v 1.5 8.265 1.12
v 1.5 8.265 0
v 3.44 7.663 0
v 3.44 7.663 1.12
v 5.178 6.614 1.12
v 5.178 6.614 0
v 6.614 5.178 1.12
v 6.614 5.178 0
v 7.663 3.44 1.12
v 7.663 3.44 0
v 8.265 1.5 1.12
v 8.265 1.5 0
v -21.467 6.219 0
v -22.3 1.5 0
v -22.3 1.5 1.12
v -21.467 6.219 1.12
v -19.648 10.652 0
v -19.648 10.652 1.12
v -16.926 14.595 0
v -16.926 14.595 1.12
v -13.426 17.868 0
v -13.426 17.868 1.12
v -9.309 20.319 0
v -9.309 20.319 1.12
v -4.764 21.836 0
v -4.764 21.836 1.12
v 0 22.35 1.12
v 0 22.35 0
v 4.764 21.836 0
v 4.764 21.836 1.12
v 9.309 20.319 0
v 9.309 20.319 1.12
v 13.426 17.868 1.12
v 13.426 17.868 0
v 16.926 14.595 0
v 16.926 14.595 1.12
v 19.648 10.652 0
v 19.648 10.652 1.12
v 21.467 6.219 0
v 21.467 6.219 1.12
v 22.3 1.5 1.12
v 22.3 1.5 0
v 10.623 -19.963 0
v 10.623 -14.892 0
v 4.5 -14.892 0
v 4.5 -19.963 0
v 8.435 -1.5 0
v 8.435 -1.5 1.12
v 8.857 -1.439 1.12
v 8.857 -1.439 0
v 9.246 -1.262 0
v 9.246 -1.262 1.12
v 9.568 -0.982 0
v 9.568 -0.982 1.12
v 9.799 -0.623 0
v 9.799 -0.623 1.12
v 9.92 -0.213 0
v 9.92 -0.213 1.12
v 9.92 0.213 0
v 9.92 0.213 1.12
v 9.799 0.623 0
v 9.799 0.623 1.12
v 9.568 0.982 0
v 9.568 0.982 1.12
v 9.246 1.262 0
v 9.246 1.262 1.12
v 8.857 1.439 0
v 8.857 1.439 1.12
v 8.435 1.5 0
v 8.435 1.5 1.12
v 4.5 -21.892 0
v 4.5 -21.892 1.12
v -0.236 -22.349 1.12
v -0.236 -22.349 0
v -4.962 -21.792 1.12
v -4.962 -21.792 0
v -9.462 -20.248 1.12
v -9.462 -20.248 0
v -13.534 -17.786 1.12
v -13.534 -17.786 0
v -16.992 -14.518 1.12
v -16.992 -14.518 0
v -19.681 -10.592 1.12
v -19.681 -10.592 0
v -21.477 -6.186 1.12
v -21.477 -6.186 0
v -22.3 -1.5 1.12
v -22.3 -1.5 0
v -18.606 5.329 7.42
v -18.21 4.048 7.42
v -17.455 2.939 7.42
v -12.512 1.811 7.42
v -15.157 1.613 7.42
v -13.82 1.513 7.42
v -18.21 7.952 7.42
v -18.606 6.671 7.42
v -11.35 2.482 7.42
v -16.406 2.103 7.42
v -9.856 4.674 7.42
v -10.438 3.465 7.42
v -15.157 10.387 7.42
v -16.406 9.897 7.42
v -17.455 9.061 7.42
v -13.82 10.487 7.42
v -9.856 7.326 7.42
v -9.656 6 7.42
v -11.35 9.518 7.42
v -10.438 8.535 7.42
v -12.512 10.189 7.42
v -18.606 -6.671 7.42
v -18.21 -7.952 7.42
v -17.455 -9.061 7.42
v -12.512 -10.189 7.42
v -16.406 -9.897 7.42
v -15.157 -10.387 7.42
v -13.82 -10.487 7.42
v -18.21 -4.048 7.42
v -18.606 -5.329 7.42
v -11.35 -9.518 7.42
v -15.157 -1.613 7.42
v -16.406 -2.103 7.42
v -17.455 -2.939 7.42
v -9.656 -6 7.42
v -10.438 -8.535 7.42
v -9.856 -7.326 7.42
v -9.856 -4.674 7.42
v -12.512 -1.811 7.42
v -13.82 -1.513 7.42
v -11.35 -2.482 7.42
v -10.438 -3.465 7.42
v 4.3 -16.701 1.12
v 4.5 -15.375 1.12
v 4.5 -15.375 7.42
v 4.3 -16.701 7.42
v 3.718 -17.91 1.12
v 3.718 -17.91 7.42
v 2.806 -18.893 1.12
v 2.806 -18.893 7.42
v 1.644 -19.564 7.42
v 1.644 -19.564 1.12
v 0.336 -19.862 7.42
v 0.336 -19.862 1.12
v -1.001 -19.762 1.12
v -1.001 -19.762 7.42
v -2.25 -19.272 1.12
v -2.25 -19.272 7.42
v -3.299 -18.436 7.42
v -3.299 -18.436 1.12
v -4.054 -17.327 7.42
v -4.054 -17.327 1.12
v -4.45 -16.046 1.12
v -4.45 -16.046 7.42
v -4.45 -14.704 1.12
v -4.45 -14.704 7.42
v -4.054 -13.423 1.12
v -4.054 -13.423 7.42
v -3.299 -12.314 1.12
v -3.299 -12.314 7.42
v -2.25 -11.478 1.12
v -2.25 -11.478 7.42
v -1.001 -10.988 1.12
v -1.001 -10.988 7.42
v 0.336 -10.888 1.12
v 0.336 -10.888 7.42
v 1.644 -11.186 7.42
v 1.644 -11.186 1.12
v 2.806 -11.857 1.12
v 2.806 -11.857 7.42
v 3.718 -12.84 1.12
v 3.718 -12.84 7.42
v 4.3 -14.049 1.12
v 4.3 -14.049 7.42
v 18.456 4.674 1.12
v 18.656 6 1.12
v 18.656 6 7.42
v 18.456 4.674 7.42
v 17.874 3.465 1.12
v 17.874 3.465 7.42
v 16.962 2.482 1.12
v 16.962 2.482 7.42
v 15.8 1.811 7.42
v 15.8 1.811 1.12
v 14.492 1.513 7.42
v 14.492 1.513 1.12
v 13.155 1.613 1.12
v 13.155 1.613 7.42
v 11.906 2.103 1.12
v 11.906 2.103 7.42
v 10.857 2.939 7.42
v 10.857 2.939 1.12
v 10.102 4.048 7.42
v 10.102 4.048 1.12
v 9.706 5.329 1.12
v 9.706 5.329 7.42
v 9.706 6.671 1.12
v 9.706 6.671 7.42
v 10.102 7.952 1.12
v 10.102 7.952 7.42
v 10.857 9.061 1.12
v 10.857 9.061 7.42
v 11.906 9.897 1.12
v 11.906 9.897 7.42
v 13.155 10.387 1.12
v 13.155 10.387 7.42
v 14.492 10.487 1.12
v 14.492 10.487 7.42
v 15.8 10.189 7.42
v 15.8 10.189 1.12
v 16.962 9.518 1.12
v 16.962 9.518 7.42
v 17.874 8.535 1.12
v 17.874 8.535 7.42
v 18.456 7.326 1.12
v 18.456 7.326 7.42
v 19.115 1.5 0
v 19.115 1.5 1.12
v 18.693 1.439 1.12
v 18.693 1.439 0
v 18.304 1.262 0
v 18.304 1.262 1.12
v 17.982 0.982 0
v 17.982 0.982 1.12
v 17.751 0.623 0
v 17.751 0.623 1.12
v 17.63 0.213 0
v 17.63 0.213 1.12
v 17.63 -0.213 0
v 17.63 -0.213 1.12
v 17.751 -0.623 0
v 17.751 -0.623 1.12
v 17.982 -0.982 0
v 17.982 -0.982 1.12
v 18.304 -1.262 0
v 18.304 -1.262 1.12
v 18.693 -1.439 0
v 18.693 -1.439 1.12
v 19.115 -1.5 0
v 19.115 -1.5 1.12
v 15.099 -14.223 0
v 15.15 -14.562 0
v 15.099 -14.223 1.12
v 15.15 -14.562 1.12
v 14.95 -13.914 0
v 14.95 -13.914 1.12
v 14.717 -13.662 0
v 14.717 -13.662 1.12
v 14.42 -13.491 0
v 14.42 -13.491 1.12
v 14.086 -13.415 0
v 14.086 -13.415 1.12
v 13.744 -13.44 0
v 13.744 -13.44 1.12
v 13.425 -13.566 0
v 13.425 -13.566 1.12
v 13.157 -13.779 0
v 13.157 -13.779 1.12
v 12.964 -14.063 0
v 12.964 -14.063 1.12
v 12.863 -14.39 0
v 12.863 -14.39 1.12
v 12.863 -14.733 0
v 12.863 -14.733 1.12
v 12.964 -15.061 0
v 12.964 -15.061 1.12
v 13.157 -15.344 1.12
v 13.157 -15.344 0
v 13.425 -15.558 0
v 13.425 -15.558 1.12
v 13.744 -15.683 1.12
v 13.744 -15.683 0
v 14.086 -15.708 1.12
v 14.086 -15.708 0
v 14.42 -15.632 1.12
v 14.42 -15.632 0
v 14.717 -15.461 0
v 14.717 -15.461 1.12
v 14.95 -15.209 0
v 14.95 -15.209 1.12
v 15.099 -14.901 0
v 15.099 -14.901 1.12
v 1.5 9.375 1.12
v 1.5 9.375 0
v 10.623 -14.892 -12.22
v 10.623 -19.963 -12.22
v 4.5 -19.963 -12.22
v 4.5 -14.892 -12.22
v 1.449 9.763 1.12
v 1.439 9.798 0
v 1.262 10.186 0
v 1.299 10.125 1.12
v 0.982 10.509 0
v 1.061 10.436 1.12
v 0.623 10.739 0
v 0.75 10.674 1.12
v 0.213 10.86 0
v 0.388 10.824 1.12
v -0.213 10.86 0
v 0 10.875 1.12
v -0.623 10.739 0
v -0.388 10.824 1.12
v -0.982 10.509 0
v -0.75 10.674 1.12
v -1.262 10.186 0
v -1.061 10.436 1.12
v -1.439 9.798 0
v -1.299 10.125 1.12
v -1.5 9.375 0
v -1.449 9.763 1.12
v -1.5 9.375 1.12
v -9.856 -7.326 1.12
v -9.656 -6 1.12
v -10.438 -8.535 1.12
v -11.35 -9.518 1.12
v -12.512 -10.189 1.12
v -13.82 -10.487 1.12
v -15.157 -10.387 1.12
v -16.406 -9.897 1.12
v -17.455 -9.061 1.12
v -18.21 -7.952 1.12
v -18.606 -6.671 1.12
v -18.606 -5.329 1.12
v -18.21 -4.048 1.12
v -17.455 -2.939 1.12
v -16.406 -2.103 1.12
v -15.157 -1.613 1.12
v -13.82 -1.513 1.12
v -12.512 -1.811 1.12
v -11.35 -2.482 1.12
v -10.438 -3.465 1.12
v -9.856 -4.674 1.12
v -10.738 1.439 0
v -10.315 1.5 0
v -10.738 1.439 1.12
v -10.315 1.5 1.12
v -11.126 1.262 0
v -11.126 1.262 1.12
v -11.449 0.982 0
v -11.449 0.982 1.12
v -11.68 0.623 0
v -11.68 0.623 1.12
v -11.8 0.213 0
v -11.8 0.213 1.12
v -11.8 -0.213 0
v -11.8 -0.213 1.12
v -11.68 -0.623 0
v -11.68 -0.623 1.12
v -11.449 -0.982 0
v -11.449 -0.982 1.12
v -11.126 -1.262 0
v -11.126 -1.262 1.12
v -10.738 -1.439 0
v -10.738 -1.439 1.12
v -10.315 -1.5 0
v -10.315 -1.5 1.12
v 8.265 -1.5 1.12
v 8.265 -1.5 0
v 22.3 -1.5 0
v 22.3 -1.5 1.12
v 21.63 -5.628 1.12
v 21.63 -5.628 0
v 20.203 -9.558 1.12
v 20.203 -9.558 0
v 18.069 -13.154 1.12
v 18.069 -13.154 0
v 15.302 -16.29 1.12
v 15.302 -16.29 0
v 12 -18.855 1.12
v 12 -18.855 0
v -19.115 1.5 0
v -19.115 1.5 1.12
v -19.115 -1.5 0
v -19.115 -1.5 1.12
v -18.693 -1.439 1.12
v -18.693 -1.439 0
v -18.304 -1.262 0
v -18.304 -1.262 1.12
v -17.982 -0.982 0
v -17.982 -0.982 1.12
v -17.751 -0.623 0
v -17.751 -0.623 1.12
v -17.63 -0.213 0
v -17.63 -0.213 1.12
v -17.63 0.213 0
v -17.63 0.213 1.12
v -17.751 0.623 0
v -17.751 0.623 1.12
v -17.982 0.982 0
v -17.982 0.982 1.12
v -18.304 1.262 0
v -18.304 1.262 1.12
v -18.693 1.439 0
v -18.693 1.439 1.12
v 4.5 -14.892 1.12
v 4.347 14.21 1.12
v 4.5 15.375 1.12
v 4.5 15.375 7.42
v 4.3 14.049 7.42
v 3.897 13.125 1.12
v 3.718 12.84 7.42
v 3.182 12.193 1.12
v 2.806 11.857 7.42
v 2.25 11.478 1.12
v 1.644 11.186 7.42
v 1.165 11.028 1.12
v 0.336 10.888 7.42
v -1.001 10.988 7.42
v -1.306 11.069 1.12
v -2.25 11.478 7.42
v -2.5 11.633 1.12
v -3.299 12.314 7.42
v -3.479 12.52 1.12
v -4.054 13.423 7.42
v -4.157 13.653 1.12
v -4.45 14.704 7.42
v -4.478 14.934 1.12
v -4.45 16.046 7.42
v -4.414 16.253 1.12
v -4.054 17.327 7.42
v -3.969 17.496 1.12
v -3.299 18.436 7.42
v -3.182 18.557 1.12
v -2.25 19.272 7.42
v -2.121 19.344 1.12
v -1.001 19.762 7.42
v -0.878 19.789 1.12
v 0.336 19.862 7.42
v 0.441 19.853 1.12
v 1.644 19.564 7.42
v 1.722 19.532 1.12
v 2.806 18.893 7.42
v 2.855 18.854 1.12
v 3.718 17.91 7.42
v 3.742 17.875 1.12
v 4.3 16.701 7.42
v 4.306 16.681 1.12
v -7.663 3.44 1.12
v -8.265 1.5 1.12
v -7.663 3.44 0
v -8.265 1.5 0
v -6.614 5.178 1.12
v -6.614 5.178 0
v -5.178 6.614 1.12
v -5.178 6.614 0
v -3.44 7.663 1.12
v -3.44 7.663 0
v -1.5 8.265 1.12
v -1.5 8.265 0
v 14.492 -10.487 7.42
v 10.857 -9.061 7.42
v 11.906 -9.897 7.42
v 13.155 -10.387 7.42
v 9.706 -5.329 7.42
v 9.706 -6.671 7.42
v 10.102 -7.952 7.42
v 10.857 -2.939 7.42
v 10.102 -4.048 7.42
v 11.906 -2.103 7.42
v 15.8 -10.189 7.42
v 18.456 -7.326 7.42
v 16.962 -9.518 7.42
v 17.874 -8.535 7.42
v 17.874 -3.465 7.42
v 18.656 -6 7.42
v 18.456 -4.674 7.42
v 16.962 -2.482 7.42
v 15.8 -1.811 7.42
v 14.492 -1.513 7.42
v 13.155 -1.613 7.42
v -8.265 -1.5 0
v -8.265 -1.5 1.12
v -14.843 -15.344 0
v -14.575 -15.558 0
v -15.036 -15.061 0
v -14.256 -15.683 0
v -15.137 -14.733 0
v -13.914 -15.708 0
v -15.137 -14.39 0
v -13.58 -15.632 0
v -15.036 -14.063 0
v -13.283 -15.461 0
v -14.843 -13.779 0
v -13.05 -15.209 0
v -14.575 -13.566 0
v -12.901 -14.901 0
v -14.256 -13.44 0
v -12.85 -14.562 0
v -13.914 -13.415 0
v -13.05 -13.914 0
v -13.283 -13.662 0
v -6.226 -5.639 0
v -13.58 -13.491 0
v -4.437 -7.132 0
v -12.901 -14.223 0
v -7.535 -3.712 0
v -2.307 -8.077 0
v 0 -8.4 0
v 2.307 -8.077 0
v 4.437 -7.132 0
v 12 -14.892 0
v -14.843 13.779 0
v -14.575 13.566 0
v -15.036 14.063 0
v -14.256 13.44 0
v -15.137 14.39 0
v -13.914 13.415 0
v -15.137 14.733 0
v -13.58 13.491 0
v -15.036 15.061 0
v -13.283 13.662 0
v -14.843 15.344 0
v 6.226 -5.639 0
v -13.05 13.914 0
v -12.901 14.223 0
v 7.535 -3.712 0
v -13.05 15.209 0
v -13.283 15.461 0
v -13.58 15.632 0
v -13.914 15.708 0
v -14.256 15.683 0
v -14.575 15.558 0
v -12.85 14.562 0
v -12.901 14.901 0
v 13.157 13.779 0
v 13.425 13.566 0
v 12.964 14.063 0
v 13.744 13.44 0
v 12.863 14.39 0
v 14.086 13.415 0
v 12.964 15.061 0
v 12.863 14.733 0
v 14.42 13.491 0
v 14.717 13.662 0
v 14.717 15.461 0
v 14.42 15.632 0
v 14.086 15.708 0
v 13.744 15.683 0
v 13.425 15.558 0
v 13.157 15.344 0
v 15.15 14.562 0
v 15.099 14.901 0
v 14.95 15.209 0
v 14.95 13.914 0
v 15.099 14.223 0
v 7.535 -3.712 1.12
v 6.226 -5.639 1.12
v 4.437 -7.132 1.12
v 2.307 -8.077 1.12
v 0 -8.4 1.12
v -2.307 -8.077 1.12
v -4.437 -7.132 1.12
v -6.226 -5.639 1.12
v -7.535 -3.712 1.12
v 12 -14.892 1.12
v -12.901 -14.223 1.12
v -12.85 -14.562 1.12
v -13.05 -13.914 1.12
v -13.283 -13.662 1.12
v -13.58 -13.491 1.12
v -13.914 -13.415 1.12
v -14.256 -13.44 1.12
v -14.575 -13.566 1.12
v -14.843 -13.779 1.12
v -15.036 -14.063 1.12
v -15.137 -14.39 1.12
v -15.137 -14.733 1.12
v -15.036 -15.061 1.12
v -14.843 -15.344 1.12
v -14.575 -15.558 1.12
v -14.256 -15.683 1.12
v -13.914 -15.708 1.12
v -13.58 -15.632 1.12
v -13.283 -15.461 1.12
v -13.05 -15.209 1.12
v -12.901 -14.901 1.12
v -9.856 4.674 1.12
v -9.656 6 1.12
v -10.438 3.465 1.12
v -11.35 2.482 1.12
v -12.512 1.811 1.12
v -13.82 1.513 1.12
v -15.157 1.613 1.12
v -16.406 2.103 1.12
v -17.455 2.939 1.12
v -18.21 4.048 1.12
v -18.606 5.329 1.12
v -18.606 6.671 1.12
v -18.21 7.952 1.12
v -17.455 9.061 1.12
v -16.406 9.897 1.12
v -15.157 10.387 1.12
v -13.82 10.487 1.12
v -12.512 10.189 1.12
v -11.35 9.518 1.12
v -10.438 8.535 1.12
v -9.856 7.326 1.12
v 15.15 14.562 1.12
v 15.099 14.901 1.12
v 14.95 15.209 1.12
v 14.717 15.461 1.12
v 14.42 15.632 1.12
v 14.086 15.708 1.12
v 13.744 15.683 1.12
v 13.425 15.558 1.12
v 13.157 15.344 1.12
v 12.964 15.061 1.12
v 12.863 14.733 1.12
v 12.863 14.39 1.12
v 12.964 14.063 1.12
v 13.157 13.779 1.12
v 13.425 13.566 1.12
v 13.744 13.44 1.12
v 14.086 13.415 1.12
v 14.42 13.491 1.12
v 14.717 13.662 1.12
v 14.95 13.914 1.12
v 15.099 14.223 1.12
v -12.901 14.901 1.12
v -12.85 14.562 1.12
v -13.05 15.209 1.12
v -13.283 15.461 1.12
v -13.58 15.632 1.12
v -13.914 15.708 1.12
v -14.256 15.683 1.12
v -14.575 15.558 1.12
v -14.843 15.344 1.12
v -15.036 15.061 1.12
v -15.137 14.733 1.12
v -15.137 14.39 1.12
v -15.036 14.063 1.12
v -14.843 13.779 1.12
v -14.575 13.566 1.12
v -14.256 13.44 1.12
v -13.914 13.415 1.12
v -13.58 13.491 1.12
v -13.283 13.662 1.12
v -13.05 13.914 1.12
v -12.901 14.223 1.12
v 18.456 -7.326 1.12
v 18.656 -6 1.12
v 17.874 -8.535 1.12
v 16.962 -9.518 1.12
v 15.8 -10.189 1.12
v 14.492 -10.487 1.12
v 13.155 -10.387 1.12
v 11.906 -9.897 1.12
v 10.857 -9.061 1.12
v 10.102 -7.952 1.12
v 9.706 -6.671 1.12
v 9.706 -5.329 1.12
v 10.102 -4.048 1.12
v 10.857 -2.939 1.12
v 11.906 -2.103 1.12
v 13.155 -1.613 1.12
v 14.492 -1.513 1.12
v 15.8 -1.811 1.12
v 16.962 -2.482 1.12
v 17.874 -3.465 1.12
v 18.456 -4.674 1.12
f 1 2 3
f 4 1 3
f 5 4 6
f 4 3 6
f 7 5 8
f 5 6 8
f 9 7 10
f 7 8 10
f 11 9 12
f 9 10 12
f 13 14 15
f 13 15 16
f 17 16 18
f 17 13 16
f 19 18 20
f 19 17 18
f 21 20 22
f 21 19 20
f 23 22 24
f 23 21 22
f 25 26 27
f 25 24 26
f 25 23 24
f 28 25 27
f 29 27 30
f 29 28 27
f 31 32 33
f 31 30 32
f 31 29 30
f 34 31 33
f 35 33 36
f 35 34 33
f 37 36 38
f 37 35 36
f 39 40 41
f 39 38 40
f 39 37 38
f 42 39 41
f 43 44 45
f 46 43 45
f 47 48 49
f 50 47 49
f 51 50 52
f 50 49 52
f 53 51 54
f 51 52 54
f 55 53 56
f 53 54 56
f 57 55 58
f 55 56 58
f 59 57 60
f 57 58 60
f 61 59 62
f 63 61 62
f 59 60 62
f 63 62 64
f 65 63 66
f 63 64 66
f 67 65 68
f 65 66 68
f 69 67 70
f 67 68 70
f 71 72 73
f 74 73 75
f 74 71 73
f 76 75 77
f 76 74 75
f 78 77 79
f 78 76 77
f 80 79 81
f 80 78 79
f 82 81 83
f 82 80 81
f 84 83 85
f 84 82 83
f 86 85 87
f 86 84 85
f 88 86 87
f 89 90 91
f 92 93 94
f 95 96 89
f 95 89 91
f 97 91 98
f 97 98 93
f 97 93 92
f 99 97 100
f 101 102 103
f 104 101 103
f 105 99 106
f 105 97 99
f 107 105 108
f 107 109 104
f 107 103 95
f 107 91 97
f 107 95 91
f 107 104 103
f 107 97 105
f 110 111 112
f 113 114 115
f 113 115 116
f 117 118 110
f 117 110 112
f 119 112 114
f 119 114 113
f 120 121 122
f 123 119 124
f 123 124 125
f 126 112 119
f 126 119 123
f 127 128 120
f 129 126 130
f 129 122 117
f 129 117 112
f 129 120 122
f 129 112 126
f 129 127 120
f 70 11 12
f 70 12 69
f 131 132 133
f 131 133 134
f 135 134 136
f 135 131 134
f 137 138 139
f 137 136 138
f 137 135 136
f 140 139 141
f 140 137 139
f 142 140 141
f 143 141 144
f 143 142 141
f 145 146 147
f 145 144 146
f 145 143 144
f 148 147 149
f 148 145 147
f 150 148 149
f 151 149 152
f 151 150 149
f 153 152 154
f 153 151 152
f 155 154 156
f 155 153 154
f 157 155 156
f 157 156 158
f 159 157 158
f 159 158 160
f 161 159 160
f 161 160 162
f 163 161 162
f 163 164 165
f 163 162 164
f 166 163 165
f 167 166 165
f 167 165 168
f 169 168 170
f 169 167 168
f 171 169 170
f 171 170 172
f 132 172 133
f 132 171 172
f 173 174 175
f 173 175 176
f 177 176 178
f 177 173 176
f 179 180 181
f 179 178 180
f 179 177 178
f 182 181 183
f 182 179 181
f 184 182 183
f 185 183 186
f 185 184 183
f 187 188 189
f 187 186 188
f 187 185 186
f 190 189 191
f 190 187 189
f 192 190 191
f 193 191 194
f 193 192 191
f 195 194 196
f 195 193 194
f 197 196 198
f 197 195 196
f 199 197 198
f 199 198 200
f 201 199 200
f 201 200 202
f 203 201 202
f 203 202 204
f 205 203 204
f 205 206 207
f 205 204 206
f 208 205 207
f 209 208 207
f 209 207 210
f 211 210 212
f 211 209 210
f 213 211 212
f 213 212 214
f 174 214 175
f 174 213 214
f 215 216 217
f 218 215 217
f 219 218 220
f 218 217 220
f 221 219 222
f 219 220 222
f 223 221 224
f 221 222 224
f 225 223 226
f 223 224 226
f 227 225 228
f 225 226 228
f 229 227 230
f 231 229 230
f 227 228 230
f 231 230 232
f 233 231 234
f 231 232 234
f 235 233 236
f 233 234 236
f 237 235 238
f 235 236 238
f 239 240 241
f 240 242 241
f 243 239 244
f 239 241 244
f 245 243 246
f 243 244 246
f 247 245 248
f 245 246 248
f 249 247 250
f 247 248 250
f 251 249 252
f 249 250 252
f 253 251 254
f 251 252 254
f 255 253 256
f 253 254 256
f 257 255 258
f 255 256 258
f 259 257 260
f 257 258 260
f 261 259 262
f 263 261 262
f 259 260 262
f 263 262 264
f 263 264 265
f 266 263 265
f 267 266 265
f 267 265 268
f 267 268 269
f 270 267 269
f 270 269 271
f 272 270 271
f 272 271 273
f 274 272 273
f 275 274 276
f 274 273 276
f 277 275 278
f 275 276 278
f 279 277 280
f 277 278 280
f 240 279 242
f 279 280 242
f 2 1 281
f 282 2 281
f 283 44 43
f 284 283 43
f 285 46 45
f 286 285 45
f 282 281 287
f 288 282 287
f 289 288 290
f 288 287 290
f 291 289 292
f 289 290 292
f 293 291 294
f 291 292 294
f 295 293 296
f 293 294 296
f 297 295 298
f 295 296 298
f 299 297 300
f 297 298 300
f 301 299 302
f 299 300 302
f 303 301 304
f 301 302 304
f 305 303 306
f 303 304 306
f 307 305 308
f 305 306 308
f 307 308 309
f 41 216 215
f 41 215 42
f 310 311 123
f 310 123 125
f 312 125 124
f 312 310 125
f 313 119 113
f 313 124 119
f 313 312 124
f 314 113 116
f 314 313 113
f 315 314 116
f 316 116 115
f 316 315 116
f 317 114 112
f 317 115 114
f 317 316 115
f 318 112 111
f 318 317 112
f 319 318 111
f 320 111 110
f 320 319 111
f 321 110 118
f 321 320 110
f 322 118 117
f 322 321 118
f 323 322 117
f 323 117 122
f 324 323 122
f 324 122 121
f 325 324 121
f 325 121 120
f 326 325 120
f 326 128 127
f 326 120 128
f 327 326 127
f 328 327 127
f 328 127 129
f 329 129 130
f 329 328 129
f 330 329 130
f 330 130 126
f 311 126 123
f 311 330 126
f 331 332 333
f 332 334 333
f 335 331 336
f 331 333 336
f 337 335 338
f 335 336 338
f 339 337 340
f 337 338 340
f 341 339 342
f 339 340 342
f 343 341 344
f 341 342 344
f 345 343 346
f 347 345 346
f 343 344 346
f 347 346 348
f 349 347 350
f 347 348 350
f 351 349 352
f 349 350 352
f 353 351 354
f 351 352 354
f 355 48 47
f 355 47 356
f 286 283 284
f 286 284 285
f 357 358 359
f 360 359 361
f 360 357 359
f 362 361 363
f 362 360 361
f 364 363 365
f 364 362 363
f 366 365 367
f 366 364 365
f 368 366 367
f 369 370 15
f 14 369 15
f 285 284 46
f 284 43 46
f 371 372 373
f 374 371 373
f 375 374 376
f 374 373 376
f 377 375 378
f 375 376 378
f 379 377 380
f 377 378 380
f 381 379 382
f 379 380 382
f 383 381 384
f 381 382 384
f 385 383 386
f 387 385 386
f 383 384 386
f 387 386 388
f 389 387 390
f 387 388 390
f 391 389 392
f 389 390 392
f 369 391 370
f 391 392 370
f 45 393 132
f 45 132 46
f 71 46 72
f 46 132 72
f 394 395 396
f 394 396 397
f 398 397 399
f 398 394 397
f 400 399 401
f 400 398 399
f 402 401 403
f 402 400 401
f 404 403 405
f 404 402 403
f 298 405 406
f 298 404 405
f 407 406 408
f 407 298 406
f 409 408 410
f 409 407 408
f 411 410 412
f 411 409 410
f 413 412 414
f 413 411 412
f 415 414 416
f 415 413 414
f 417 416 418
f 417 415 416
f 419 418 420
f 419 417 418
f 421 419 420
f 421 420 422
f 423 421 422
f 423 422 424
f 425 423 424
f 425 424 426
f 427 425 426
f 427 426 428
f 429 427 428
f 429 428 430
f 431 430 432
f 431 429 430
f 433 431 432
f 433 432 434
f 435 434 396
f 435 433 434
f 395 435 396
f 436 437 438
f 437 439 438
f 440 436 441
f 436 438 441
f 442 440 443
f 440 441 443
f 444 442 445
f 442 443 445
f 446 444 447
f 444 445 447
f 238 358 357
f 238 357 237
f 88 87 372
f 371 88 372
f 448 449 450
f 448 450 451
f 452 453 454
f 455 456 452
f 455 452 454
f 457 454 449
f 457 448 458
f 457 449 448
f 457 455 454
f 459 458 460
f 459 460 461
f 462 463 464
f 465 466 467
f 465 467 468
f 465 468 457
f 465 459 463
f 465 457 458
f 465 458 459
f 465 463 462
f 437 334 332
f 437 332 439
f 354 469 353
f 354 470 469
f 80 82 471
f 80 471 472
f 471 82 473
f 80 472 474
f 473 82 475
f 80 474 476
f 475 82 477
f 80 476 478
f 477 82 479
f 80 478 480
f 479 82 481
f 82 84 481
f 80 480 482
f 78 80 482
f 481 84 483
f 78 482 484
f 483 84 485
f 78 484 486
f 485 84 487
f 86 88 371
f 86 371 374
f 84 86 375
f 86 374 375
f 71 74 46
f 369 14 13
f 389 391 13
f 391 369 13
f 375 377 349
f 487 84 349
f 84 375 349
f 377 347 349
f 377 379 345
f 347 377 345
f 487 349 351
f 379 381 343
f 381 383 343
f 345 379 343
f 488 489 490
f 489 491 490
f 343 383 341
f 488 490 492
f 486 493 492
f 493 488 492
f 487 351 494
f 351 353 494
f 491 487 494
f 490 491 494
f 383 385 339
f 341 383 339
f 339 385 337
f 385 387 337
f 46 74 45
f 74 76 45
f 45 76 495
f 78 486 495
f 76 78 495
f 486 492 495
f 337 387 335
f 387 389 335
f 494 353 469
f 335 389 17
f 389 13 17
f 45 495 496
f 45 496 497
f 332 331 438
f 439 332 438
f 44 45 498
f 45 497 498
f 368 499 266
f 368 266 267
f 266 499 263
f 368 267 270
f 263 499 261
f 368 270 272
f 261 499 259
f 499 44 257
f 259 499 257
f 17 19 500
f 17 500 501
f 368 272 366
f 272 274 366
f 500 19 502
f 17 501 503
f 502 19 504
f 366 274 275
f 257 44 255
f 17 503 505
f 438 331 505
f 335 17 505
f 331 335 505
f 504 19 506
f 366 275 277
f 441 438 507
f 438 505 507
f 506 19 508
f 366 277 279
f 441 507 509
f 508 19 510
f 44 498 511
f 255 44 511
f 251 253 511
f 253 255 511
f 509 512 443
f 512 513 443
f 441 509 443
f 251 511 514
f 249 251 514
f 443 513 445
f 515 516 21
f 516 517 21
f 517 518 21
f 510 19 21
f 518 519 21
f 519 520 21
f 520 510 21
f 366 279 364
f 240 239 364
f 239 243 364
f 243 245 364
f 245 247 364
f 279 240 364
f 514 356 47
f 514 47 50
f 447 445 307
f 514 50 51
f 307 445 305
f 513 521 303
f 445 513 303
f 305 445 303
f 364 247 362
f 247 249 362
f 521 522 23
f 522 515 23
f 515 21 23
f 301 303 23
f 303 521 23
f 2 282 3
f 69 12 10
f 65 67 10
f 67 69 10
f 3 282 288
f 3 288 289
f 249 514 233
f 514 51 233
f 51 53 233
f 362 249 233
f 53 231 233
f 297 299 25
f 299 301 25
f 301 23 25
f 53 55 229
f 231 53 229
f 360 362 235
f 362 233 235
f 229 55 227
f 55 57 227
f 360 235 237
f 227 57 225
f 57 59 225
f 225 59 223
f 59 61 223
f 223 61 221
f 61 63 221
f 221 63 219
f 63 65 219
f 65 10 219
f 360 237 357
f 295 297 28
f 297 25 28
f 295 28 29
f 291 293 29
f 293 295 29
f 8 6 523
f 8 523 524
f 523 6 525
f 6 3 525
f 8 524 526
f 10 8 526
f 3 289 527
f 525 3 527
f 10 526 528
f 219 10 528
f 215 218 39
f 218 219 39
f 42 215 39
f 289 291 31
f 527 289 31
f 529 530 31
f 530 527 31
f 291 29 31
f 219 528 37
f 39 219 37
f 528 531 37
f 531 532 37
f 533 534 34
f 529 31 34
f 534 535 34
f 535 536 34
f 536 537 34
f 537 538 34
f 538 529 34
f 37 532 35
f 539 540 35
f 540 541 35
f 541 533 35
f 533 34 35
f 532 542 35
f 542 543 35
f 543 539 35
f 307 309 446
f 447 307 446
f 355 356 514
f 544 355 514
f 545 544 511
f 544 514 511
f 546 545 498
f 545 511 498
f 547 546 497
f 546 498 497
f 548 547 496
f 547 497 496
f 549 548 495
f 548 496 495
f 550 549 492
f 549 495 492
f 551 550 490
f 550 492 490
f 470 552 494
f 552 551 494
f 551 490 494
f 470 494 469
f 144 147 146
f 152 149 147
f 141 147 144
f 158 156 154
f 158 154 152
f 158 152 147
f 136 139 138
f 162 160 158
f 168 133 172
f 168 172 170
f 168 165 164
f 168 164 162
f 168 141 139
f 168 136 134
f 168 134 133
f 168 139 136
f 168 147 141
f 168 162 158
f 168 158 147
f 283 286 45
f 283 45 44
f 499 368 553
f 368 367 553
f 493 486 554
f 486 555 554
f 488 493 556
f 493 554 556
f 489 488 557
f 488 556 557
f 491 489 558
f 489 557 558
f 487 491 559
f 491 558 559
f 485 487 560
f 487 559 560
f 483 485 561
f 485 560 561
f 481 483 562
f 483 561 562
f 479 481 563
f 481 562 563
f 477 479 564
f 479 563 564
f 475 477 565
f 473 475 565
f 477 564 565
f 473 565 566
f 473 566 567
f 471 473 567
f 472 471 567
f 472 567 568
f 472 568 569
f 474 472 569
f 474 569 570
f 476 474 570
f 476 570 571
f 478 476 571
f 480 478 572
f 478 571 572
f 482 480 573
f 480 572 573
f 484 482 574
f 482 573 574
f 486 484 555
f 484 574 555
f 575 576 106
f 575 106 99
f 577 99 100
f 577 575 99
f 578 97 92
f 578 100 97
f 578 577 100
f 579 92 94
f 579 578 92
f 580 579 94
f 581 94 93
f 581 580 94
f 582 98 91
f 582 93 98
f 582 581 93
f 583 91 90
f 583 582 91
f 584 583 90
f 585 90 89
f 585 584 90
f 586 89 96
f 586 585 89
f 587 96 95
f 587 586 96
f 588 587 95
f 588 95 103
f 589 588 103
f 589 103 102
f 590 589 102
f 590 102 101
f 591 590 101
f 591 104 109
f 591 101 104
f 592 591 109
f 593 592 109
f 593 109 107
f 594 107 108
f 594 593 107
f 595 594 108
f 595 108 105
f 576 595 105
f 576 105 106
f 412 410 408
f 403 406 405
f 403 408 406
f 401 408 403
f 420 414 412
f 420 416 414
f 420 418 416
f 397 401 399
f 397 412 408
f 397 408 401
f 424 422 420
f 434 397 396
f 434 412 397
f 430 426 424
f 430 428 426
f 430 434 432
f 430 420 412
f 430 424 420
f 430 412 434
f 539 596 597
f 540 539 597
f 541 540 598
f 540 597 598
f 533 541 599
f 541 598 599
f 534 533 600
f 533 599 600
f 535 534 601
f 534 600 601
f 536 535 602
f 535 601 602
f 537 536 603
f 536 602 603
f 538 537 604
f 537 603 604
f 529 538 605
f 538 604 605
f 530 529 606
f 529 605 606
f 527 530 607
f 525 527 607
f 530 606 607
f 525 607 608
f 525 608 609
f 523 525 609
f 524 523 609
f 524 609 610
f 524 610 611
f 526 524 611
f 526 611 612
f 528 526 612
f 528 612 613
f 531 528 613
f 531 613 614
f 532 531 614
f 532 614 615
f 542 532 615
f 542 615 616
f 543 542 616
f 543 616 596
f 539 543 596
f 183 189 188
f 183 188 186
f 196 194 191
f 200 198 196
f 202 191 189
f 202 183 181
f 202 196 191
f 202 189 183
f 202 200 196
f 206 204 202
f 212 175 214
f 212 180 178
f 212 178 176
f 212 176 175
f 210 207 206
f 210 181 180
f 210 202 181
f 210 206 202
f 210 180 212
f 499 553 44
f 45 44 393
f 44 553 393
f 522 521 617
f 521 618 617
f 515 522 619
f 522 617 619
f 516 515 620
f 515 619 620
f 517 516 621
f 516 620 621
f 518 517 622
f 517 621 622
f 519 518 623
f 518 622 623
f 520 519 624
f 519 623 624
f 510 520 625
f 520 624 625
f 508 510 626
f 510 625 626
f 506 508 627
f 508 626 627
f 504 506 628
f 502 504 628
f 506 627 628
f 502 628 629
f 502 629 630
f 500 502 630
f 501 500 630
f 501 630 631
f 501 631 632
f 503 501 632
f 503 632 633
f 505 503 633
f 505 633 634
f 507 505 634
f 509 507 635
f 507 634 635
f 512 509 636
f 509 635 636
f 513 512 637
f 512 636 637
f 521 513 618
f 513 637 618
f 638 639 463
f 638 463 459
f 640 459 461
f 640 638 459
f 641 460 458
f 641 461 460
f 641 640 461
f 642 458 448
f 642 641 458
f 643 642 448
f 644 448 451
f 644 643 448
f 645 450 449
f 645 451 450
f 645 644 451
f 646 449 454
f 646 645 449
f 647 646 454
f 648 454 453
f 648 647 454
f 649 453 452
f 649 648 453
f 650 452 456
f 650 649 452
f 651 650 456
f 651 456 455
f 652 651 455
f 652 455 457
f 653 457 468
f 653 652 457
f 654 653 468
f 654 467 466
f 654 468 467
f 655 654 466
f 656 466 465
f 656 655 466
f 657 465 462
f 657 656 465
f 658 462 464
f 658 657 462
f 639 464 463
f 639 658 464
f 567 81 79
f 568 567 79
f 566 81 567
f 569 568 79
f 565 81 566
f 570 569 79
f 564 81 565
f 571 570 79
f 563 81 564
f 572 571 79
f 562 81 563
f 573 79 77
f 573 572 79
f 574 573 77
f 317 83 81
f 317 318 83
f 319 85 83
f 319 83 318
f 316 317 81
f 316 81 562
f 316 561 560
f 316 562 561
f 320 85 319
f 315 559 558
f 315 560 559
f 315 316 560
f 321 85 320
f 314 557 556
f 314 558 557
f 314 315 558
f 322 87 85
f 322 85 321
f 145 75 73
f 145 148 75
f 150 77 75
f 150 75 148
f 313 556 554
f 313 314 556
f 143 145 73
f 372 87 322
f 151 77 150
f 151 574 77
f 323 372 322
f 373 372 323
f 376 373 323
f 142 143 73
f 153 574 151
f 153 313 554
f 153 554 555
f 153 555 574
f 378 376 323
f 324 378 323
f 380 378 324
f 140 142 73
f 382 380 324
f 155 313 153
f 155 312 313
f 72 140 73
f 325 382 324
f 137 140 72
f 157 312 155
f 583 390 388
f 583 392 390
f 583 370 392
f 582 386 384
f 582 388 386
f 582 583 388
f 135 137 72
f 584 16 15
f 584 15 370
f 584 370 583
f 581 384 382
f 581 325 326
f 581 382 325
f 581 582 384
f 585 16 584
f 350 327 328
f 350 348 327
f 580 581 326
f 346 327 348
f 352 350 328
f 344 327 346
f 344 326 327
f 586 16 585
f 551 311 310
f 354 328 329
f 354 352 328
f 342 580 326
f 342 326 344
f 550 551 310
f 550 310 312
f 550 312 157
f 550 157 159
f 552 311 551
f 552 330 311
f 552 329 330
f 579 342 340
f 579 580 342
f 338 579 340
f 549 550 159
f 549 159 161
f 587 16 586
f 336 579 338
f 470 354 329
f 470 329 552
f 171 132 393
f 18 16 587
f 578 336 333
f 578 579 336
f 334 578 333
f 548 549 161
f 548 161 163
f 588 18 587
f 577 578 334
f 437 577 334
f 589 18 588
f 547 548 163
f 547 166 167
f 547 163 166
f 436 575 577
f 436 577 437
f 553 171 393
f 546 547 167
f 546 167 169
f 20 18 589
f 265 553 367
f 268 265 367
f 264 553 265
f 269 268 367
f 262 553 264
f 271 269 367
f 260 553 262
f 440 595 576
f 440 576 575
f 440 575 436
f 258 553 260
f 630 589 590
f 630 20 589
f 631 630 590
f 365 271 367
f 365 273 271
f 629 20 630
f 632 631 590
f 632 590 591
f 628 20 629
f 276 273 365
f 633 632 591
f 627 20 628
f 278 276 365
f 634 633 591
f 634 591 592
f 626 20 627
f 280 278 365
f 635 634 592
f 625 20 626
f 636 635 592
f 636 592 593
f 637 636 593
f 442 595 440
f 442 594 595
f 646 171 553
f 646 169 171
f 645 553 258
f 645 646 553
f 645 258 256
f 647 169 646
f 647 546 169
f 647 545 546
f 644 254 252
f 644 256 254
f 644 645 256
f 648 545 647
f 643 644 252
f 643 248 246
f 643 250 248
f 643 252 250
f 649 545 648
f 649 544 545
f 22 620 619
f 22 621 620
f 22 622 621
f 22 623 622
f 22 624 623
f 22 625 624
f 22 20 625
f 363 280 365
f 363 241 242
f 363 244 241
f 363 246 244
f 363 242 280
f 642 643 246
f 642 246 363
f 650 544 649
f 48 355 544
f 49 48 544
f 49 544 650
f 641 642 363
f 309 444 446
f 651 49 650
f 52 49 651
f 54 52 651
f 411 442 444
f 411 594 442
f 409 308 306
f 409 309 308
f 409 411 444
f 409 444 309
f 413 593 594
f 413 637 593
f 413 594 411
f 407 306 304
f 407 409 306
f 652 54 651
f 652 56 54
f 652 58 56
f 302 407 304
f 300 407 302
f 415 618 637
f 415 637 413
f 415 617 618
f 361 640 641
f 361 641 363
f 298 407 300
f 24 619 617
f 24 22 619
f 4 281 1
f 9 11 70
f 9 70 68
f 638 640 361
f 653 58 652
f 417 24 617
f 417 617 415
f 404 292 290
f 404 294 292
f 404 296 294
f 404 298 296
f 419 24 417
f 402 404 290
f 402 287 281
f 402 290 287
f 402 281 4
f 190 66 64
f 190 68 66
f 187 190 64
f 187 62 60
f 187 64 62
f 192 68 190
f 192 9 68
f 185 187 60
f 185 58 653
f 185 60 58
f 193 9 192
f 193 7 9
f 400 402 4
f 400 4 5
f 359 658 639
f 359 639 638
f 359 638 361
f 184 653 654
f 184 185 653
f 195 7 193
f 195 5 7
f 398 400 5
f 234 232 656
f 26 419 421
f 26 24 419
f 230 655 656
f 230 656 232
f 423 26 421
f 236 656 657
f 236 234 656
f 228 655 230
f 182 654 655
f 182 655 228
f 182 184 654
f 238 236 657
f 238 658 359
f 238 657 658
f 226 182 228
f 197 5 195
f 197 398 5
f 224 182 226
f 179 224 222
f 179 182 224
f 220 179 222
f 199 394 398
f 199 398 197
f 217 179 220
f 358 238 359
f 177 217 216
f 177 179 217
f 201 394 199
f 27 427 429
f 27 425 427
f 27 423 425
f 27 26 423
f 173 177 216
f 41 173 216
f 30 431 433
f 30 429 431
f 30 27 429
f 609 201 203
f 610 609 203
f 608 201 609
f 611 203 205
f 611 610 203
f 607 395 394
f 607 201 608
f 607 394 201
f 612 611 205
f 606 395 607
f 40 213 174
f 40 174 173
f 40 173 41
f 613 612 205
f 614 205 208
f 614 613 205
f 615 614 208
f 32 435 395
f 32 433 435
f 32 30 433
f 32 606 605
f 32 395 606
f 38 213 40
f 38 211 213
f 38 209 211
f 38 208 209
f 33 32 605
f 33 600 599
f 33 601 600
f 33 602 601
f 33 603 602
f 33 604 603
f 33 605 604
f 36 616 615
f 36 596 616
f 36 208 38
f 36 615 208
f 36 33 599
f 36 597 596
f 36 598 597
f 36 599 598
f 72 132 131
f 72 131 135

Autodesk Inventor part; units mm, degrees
ref_plane "YZ Plane" through (0, 0, 0) normal (1, 0, 0) x (0, 1, 0)
ref_plane "XZ Plane" through (0, 0, 0) normal (0, 1, 0) x (-1, 0, 0)
ref_plane "XY Plane" through (0, 0, 0) normal (0, 0, 1) x (1, 0, 0)
sketch "Base" plane through (0, 0, 0) normal (0, 0, 1) x (1, 0, 0)
  circle A0 centre (0, 0) radius 22.35
  circle A1 centre (0, 0) radius 8.4
  dimension "d0" = 44.7
  dimension "d1" = 16.8
extrude "BaseFeature" add sketch "Base" along normal blind 1.12
sketch "InsideProfile" plane through (0, 0, 1.12) normal (0, 0, 1) x (1, 0, 0)
  circle A0 centre (0, 0) radius 8.4 projected
  circle A1 centre (0, 0) radius 22.35 projected
  circle A2 centre (0, 0) radius 15.375 construction
  line L0 (0, 15.375) -> (0, -15.375) construction
  circle A3 centre (0, 15.375) radius 4.5
  circle A4 centre (0, -15.375) radius 4.5
  circle A5 centre (-14.1559, 6) radius 4.5
  circle A6 centre (-14.1559, -6) radius 4.5
  circle A7 centre (14.1559, 6) radius 4.5
  circle A8 centre (14.1559, -6) radius 4.5
  line L1 (0, 9.375) -> (0, 4.7505) construction
  line L2 (-1.5, 9.375) -> (-1.5, 4.7505)
  line L3 (1.5, 4.7505) -> (1.5, 9.375)
  arc A9 (1.5, 9.375) -> (-1.5, 9.375) centre (0, 9.375) ccw
  arc A10 (-1.5, 4.7505) -> (1.5, 4.7505) centre (0, 4.7505) ccw
  line L4 (0, -31.29) -> (0, 31.29) construction
  line L5 (-14.1559, 6) -> (-14.1559, -6) construction
  line L6 (-38.1332, 0) -> (38.1332, 0) construction
  line L7 (-10.3152, 0) -> (8.4348, 0) construction
  line L8 (-10.3152, 1.5) -> (8.4348, 1.5)
  line L9 (8.4348, -1.5) -> (-10.3152, -1.5)
  arc A11 (-10.3152, 1.5) -> (-10.3152, -1.5) centre (-10.3152, 0) ccw
  arc A12 (8.4348, -1.5) -> (8.4348, 1.5) centre (8.4348, 0) ccw
  line L10 (-25.738, 0) -> (-19.1152, 0) construction
  line L11 (-25.738, -1.5) -> (-19.1152, -1.5)
  line L12 (-19.1152, 1.5) -> (-25.738, 1.5)
  arc A13 (-25.738, 1.5) -> (-25.738, -1.5) centre (-25.738, 0) ccw
  arc A14 (-19.1152, -1.5) -> (-19.1152, 1.5) centre (-19.1152, 0) ccw
  line L13 (25.738, -1.5) -> (19.1152, -1.5)
  line L14 (19.1152, 1.5) -> (25.738, 1.5)
  arc A15 (25.738, -1.5) -> (25.738, 1.5) centre (25.738, 0) ccw
  arc A16 (19.1152, 1.5) -> (19.1152, -1.5) centre (19.1152, 0) ccw
  point P0 (0, 7.0627)
  point P1 (-14.1559, 0)
  point P2 (-0.9402, 0)
  point P3 (-22.4266, 0)
  point P4 (1.5, 8.265)
  point P5 (-1.5, 8.265)
  dimension "d4" = 13.95
  dimension "d5" = 6.975
  dimension "d6" = 9
  dimension "d8" = 12
  dimension "d9" = 1.5
  dimension "d10" = 2.3123
  dimension "d11" = 9.375
  dimension "d12" = 10.3152
  dimension "d13" = 9.375
  dimension "d14" = 8.8
  dimension "d15" = 15.4228
extrude "CutsFeature" cut sketch "InsideProfile" against normal through all contours A0 L9 L8 | A0 L8 A12 L9 | L3 A10 L2 A0 | A0 L2 A9 L3 | A0 L9 A11 L8 | A1 L13 A16 L14 | A1 L14 A15 L13 | L12 A14 L11 A1 | A1 L11 A13 L12
extrude "LightsFeature" add sketch "InsideProfile" along normal blind 6.3 contours A3 | A4 | A5 | A6 | A7 | A8
sketch "MountHoles" plane through (0, 0, 1.12) normal (0, 0, 1) x (1, 0, 0)
  circle A0 centre (-14, 14.5616) radius 1.15
  circle A1 centre (14, 14.5616) radius 1.15
  line L0 (-14, 14.5616) -> (14, 14.5616) construction
  circle A2 centre (0, 0) radius 21.35 construction
  arc A3 (22.2996, 1.5) -> (-22.2996, 1.5) centre (0, 0) ccw construction
  line L1 (-31.2195, 0) -> (31.2195, 0) construction
  circle A4 centre (-14, -14.5616) radius 1.15
  circle A5 centre (14, -14.5616) radius 1.15
  dimension "d20" = 28
  dimension "d21" = 2.3
  dimension "d22" = 2.3
  dimension "d23" = 1
extrude "MountHolesFeature" cut sketch "MountHoles" against normal through all
sketch "Sketch4" plane through (0, 0, 1.12) normal (0, 0, 1) x (1, 0, 0)
  arc A0 (-22.2996, -1.5) -> (22.2996, -1.5) centre (0, 0) ccw projected
  line L0 (12, -18.8553) -> (12, -14.8923)
  line L1 (12, -14.8923) -> (4.5, -14.8923)
  line L2 (4.5, -14.8923) -> (4.5, -21.8923)
  line L3 (4.5, -21.8923) -> (12, -21.8923)
  line L4 (12, -21.8923) -> (12, -18.8553)
  circle A1 centre (0, -15.375) radius 4.5 projected
  circle A2 centre (14, -14.5616) radius 1.15 projected
  dimension "d26" = 2
  dimension "d27" = 7
extrude "Extrusion5" cut sketch "Sketch4" against normal through all contours L2 L1 L0 A0
sketch "Sketch5" plane through (0, 0, 0) normal (0, 0, -1) x (-1, 0, 0)
  line L0 (-4.5, -14.8923) -> (-12, -14.8923) projected
  line L1 (-4.5, -14.8923) -> (-10.6227, -14.8923)
  line L2 (-10.6227, -14.8923) -> (-10.6227, -19.9633)
  line L3 (-10.6227, -19.9633) -> (-4.5, -19.9633)
  line L4 (-4.5, -19.9633) -> (-4.5, -14.8923)
  point P0 (0, 0)
  dimension "d30" = 5.071
  dimension "d31" = 6.1227
extrude "Extrusion6" add sketch "Sketch5" along normal blind 12.22
equation "\"d5\" = 0.5 * d4"
equation "\"d13\" = d11"
properties part number "IRLed"
